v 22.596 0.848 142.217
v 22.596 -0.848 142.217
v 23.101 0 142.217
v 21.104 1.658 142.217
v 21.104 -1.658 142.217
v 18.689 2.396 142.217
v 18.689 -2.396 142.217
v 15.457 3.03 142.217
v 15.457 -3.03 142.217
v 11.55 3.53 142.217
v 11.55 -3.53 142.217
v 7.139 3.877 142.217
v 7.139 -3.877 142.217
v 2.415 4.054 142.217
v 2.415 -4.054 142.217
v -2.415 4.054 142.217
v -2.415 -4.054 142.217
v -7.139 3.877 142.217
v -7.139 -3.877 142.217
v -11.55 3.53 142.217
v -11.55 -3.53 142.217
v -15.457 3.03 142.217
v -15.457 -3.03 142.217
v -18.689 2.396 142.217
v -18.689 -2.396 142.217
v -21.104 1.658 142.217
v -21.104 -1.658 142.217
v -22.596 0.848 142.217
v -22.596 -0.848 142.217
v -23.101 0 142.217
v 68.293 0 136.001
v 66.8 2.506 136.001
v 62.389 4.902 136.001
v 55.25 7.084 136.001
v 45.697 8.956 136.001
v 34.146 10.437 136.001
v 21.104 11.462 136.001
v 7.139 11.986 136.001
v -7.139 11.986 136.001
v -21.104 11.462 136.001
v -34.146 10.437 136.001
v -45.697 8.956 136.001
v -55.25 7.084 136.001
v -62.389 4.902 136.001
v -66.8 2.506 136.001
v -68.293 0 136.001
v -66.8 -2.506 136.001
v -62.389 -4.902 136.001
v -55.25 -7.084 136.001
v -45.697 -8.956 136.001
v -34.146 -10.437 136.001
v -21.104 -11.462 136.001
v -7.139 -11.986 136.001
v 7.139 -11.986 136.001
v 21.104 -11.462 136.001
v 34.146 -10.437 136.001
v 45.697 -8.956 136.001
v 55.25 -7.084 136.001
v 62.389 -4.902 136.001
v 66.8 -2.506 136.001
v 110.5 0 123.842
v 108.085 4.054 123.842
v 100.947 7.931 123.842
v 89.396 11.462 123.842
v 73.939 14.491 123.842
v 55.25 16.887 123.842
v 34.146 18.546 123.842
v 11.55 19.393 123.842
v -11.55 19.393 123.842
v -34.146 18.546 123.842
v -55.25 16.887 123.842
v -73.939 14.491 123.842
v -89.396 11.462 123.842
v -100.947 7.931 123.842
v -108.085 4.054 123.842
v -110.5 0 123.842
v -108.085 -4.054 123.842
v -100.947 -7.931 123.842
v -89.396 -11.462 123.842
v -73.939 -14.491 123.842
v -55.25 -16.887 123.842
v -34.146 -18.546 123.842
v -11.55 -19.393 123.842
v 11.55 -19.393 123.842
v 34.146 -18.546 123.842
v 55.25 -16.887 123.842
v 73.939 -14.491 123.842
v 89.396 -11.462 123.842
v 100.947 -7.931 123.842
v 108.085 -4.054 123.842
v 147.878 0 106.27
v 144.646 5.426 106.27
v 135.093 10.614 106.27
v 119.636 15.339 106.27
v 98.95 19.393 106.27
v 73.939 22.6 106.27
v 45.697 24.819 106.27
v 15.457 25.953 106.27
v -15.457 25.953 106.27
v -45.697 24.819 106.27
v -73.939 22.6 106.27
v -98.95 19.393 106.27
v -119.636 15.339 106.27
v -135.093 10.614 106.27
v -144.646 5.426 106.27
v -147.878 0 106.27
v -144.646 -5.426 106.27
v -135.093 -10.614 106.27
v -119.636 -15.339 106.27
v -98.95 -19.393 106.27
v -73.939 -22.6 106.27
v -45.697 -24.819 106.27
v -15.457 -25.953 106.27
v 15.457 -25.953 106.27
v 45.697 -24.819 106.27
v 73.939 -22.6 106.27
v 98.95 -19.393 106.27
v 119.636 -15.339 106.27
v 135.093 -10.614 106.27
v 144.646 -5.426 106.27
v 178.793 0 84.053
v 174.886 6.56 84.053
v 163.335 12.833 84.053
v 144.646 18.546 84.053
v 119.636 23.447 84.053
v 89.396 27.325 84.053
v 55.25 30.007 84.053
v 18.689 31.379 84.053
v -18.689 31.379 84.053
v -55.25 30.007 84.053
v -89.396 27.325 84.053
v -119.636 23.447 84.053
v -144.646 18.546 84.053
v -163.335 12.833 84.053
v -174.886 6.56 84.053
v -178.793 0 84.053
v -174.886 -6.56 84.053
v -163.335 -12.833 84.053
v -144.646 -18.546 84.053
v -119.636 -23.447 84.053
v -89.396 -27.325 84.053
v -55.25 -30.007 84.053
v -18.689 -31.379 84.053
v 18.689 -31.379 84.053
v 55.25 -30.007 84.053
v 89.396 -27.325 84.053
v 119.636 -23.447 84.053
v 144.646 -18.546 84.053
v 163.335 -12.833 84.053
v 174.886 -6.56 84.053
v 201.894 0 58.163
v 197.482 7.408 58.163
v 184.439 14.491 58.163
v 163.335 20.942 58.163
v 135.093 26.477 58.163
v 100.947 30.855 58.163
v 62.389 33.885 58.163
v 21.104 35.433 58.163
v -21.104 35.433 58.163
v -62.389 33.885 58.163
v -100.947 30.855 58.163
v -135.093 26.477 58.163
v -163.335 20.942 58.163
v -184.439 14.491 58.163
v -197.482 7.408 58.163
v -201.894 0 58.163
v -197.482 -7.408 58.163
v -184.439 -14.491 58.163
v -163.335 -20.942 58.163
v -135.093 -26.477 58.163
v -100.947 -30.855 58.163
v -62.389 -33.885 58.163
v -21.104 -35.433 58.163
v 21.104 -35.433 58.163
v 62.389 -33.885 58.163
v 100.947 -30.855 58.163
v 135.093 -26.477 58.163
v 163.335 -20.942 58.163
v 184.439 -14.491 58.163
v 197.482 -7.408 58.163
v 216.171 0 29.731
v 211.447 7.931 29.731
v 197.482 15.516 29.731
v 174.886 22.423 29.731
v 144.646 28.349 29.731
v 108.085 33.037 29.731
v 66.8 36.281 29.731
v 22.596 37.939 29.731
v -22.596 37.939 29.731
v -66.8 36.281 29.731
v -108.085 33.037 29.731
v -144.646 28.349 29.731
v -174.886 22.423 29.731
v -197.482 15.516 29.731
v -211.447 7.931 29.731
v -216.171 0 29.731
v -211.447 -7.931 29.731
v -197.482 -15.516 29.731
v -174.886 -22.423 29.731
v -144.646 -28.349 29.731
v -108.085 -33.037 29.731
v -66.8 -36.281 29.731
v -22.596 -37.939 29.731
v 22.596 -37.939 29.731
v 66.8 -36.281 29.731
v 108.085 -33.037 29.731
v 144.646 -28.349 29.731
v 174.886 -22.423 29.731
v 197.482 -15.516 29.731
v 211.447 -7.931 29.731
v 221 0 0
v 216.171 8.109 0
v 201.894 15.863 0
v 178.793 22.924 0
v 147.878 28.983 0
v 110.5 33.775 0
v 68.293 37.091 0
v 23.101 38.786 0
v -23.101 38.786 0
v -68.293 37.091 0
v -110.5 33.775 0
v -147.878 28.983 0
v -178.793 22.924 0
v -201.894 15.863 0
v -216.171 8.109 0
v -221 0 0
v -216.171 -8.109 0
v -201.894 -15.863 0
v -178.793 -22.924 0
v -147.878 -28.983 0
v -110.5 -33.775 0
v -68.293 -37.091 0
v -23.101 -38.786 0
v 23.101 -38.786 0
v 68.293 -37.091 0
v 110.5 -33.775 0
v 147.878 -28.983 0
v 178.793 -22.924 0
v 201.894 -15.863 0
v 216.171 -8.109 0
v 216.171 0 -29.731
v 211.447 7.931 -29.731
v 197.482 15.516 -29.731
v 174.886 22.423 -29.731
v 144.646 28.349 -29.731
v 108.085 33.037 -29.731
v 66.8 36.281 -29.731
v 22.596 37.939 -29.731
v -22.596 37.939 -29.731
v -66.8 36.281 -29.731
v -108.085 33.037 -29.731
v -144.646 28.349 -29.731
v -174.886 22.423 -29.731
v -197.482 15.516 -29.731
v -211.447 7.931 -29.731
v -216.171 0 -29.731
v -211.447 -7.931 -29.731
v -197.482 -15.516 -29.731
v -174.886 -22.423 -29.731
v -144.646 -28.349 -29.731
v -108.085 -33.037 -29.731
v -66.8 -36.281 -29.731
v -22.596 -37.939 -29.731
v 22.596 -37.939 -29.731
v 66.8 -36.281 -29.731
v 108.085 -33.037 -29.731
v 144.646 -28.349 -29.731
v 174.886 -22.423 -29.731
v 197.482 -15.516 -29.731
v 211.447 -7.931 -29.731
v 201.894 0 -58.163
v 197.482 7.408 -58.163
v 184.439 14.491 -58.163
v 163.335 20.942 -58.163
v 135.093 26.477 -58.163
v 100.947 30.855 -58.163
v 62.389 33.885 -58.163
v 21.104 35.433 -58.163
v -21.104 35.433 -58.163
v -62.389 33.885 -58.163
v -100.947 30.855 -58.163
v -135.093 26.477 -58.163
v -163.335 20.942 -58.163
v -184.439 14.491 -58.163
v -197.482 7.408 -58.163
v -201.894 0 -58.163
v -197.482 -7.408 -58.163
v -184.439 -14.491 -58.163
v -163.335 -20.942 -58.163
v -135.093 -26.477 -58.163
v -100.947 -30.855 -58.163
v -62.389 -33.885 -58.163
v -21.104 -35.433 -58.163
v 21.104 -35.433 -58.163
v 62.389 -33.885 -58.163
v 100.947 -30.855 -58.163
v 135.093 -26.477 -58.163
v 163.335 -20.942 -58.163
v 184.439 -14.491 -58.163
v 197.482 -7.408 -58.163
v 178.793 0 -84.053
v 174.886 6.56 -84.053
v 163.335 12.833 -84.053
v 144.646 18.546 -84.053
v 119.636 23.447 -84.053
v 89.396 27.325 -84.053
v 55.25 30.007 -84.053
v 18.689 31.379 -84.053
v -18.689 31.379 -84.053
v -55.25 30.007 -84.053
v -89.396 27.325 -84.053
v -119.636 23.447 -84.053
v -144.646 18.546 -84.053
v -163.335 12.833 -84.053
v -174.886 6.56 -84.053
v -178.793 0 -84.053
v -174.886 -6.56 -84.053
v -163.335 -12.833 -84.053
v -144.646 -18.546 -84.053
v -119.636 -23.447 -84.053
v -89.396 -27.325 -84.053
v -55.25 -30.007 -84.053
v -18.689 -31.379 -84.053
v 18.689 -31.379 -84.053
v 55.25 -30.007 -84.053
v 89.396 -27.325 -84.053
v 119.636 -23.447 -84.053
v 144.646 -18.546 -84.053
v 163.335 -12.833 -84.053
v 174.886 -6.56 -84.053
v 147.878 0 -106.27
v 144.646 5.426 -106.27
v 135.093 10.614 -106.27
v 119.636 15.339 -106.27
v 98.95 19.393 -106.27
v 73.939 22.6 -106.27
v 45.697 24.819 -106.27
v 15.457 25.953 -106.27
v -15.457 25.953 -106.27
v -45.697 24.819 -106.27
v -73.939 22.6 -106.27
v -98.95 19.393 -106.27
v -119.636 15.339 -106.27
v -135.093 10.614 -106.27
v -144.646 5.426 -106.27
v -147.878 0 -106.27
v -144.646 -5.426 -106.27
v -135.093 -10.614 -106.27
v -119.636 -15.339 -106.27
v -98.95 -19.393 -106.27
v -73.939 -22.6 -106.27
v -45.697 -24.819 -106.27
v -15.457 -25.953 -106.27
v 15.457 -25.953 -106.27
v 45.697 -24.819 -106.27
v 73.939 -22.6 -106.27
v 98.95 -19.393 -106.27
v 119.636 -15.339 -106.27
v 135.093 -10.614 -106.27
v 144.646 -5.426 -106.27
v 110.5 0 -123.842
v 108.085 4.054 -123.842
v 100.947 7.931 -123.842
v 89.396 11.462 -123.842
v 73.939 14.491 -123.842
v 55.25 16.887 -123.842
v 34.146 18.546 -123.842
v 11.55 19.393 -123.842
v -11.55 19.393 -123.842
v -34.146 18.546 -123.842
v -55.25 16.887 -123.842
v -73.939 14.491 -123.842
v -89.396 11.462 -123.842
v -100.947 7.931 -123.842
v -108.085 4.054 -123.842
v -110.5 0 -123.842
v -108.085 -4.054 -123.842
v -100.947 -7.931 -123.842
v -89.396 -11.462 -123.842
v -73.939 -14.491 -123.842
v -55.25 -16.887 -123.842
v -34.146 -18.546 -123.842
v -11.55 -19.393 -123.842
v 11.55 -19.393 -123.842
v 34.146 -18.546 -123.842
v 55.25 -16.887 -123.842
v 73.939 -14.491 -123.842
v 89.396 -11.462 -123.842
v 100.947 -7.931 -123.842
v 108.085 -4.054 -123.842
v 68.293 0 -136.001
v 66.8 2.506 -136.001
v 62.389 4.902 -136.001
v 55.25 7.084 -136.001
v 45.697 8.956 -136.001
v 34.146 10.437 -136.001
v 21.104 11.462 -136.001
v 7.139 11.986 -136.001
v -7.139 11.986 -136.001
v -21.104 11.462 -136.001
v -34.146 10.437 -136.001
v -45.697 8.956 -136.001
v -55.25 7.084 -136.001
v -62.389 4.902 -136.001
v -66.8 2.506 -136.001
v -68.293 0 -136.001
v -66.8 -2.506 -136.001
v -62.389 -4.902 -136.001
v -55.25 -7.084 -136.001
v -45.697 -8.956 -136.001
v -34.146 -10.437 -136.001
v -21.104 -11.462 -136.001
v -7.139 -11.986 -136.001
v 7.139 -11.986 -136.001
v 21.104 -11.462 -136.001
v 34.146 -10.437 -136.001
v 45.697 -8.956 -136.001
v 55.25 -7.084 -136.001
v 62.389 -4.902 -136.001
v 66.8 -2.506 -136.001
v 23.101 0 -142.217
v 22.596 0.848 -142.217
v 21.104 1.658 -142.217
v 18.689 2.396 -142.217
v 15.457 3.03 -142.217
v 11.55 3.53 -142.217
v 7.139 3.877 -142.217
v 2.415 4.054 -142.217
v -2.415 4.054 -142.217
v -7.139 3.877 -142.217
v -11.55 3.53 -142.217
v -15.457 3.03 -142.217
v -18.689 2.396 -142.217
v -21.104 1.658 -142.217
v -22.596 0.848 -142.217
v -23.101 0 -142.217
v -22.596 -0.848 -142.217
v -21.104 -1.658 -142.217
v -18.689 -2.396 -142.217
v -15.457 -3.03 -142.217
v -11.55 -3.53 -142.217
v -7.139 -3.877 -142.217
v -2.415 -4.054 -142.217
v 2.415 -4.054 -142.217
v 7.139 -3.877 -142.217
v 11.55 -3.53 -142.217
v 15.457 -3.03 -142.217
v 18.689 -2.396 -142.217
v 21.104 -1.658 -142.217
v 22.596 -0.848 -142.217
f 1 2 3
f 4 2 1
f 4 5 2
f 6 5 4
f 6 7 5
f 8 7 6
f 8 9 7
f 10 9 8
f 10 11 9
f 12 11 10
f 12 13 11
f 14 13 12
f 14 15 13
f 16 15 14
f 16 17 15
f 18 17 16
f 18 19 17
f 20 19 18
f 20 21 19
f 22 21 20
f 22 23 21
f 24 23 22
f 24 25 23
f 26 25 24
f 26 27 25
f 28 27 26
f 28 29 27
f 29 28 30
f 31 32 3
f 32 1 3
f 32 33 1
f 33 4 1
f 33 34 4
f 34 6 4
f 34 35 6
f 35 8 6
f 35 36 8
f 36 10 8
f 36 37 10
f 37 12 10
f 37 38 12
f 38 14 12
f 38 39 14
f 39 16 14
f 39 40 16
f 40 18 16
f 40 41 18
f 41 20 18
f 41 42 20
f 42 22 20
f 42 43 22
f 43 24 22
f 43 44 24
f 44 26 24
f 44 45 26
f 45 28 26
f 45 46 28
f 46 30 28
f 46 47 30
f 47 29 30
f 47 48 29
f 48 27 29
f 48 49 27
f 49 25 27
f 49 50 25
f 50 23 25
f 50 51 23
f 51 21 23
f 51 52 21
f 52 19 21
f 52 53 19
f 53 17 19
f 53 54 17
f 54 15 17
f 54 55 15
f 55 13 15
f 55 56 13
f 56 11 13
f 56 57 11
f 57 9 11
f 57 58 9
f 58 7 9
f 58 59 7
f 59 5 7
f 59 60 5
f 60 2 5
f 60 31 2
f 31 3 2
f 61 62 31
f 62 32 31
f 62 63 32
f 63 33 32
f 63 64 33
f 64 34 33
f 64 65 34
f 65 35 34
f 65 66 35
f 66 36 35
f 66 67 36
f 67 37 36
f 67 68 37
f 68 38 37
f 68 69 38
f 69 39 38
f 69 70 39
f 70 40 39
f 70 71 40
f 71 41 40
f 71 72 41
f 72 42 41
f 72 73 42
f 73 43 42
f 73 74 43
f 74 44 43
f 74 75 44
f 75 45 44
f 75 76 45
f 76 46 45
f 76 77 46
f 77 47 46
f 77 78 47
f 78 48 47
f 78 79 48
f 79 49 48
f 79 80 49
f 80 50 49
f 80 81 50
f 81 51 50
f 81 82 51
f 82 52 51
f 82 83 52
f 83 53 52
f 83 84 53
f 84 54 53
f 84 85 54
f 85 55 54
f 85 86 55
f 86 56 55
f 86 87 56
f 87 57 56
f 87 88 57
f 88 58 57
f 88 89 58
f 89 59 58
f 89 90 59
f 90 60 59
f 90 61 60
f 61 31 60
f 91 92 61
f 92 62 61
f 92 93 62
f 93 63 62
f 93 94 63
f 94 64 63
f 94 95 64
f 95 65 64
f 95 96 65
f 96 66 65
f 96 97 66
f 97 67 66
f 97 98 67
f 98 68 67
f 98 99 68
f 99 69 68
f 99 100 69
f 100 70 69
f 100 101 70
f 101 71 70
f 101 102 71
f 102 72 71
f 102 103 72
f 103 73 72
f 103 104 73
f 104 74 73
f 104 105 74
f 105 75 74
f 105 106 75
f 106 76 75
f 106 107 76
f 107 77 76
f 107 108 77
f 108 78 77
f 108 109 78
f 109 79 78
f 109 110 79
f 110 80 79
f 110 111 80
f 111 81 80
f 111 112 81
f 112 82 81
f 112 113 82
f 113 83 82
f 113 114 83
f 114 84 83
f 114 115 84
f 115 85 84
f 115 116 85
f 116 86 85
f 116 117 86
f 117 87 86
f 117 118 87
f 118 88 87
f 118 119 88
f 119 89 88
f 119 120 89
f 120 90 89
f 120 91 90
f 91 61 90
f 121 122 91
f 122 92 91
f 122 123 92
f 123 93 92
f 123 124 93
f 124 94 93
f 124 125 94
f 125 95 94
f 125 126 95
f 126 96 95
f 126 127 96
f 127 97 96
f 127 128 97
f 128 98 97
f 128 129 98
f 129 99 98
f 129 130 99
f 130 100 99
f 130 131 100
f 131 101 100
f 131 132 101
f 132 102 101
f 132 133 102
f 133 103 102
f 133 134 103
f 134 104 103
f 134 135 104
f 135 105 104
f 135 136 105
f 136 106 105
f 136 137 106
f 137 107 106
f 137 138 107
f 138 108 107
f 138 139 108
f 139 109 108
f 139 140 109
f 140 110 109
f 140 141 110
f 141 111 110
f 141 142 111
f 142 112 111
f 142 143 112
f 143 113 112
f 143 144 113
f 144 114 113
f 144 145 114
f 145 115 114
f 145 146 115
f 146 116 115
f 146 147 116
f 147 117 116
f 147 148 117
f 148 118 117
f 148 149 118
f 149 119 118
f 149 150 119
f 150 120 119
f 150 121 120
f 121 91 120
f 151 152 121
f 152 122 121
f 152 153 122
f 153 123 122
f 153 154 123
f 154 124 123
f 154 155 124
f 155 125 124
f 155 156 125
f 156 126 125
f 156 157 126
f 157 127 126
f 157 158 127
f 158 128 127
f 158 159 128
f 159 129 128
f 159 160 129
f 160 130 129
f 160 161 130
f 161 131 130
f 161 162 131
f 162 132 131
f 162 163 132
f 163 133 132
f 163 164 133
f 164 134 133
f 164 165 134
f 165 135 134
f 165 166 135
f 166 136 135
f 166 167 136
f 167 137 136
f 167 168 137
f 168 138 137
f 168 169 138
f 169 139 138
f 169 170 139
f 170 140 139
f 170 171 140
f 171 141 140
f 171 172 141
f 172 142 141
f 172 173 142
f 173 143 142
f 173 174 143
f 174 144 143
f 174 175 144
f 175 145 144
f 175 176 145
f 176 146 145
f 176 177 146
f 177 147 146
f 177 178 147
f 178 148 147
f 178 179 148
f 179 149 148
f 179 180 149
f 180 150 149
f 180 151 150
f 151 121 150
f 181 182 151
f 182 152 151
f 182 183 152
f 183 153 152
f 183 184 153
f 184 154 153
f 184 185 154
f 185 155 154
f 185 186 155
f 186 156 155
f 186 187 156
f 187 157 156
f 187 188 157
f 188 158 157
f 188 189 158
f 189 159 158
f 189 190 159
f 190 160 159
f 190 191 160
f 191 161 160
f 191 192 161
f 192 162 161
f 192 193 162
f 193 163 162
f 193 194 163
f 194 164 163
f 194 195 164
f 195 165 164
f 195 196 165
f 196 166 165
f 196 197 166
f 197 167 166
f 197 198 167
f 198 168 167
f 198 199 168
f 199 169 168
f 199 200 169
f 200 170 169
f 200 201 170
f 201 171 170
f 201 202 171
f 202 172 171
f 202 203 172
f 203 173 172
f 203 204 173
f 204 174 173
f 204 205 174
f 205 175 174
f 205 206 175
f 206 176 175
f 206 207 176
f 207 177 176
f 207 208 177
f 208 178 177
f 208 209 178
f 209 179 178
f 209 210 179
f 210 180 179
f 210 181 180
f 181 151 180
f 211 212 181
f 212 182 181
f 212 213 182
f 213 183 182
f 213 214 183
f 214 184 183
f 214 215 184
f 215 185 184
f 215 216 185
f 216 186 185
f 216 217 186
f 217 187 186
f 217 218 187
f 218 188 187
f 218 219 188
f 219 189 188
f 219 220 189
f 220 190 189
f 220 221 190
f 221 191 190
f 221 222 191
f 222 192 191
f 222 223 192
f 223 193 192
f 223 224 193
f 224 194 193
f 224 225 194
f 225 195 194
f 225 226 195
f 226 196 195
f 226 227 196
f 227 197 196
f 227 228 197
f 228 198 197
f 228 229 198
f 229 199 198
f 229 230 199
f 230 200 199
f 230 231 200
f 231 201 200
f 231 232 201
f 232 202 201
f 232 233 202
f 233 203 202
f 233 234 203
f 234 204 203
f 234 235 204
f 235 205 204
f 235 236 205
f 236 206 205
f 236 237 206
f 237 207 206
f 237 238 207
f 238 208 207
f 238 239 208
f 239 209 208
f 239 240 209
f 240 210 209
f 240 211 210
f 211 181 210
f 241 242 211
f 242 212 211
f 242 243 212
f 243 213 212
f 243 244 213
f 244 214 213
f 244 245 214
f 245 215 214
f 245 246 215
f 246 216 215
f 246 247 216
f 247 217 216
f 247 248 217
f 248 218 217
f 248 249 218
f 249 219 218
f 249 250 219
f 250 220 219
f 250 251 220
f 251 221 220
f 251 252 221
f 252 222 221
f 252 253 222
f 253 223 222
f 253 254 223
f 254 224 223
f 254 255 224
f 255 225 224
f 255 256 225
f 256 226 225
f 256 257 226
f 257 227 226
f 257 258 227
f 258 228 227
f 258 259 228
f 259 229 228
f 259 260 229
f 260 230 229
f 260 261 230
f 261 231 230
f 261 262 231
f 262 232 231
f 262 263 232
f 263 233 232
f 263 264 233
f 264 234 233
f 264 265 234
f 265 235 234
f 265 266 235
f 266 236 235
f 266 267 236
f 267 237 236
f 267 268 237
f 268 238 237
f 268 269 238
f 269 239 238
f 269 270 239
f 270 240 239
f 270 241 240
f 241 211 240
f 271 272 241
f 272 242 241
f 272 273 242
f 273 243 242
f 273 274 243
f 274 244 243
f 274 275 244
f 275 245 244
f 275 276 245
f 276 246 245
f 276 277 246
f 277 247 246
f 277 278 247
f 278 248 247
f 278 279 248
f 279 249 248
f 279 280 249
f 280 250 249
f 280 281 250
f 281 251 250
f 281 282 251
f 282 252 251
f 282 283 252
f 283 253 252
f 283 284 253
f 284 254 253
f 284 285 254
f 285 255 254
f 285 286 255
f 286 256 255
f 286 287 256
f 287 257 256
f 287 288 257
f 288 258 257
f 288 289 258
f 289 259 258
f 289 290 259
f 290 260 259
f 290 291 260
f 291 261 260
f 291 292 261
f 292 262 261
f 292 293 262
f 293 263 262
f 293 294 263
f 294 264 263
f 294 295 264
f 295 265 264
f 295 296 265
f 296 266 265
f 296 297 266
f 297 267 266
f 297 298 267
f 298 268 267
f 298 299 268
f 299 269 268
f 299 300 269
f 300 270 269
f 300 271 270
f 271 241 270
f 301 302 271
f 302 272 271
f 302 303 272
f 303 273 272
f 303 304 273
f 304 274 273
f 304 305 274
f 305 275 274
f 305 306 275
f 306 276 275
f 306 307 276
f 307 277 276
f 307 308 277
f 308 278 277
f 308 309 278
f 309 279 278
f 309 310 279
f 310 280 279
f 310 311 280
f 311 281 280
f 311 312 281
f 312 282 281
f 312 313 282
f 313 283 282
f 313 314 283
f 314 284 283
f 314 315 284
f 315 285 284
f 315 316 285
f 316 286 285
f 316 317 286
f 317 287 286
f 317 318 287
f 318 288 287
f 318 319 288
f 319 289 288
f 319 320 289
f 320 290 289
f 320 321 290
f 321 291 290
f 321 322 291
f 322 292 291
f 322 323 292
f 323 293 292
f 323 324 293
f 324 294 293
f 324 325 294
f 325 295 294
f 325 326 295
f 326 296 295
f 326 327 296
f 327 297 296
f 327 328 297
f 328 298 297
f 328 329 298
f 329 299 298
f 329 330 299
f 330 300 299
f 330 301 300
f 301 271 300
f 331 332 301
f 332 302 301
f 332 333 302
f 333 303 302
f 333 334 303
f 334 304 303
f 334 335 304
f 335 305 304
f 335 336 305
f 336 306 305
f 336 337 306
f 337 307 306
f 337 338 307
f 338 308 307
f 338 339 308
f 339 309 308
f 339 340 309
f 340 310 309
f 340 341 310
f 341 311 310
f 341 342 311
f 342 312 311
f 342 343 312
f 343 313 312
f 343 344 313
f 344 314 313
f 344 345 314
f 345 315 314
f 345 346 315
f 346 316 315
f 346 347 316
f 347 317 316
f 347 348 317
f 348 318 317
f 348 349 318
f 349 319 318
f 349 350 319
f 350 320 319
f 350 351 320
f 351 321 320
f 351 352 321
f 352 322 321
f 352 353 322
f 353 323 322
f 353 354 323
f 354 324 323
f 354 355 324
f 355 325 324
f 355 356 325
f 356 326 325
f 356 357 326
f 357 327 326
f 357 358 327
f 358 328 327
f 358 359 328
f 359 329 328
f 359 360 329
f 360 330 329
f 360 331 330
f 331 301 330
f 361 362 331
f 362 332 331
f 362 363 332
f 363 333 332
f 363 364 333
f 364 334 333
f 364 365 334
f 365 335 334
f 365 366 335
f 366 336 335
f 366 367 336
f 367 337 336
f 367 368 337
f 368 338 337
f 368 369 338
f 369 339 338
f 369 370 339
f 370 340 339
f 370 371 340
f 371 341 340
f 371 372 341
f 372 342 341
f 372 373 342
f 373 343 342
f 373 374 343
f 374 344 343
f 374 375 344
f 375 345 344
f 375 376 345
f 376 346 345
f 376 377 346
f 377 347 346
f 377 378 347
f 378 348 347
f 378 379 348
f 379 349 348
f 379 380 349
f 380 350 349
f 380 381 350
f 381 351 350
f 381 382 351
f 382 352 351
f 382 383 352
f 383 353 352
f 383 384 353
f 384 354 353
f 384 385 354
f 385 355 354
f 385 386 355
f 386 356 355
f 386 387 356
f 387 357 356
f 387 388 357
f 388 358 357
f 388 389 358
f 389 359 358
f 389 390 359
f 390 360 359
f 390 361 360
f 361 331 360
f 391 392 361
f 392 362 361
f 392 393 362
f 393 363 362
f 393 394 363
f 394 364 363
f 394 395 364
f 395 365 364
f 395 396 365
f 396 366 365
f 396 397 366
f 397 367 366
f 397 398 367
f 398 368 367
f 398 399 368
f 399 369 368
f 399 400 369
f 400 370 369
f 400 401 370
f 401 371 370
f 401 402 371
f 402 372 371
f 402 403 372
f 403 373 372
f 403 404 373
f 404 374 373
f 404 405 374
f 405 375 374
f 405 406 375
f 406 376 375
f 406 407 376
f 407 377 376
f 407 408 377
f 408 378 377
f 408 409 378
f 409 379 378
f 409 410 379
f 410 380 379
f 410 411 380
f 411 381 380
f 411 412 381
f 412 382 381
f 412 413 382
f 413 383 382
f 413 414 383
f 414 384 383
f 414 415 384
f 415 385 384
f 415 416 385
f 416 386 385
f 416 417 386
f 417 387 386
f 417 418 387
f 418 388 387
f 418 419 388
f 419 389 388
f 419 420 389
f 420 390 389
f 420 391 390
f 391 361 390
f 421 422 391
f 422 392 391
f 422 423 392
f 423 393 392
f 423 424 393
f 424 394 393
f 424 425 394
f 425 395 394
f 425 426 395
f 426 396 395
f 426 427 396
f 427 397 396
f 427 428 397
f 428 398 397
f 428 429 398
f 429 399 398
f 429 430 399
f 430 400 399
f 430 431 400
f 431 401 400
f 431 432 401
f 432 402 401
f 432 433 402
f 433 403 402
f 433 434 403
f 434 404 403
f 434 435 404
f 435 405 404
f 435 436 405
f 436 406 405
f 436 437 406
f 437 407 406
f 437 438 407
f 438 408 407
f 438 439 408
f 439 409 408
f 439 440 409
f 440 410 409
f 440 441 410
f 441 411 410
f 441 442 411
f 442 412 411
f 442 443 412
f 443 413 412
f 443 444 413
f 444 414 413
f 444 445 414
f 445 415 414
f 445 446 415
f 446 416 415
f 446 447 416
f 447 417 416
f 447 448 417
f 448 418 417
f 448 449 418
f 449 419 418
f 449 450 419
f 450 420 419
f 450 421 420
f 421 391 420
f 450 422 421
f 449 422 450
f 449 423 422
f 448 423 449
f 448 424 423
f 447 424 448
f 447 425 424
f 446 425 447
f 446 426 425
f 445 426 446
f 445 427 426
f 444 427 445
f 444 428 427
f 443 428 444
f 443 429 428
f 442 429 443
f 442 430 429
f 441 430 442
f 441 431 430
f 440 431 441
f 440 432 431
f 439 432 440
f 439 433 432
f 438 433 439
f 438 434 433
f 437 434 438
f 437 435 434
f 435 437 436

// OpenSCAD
// Generated by SolidPython 1.0.1 on 2020-07-29 00:46:52


scale(v = [17, 3, 11]) {
	sphere(r = 13);
}
/***********************************************
*********      SolidPython code:      **********
************************************************
 
# import packages: SolidPython
from solid import *
from solid.utils import *
from itertools import chain, combinations, permutations


class Resize:

    def __init__(self, scad_file):
        self.scad_file = scad_file
        #self.scad_file = import_scad(scad_file)
        # cone/cylinder param:
        self.r1 = 0
        self.r2 = 0
        self.h = 0
        # rectangular prism param:
        self.w = 0
        self.l = 0
        # ellipse param:
        self.r = 0

    # import OpenScad code (file name corresponds to shape)


    # classify shape + parameters
    def assign(self, param1, param2, param3):
        if self.scad_file == 'cone.scad':
            self.r1 = param1
            self.r2 = param2
            self.h = param3
        elif self.scad_file == 'cylinder.scad':
            self.r1 = param1
            self.r2 = param2
            self.h = param3
        elif self.scad_file == 'rectangularPrism.scad':
            self.h = param1
            self.l = param2
            self.w = param3
        else:
            self.r = param1
            self.h = param2

    # resize parameters
    def iterate(self):
        x = range(3, 20, 2)
        i = 1
        if self.scad_file == 'cone.scad':
            tempList = list(permutations(x, 2))
            for temp in tempList:
                param1 = temp[0]
                param2 = temp[1]
                filepath = 'produced_scad_files/' + 'cone' + str(param1) + '_' + str(param2) + '_' + '.scad'
                scad_render_to_file(cylinder(h=param1, r1=param2, r2=0), filepath)

        elif self.scad_file == 'cylinder.scad':
            tempList = list(permutations(x, 3))
            for temp in tempList:
                param1 = temp[0]
                param2 = temp[1]
                filepath = 'produced_scad_files/' + 'cylinder' + str(param1) + '_' + str(param2) + '_' + '.scad'
                scad_render_to_file(cylinder(h=param1, r1=param2, r2=param2), filepath)

        elif self.scad_file == 'rectangularPrism.scad':
            tempList = list(permutations(x, 3))
            for temp in tempList:
                param1 = temp[0]
                param2 = temp[1]
                param3 = temp[2]
                filepath = 'produced_scad_files/' + 'rectangularPrism' + str(param1) + '_' + str(param2) + '_' + str(
                    param3) + '.scad'
                scad_render_to_file(cube(size=(param1, param2, param3)), filepath)

        elif self.scad_file == 'ellipse.scad':
            tempList = list(permutations(x, 4))
            for temp in tempList:
                param1 = temp[0]
                param2 = temp[1]
                param3 = temp[2]
                param4 = temp[3]
                filepath = 'produced_scad_files/' + 'ellipse' + str(param1) + '_' + str(param2) + '_' + str(param3) + '_' + str(param4) + '.scad'
                scad_render_to_file(scale([param1, param2, param3])(sphere(r=param4)), filepath)

    def render_to_scadfile(self):
        scad_render_to_file(scad, 'example.scad') 
 
************************************************/
